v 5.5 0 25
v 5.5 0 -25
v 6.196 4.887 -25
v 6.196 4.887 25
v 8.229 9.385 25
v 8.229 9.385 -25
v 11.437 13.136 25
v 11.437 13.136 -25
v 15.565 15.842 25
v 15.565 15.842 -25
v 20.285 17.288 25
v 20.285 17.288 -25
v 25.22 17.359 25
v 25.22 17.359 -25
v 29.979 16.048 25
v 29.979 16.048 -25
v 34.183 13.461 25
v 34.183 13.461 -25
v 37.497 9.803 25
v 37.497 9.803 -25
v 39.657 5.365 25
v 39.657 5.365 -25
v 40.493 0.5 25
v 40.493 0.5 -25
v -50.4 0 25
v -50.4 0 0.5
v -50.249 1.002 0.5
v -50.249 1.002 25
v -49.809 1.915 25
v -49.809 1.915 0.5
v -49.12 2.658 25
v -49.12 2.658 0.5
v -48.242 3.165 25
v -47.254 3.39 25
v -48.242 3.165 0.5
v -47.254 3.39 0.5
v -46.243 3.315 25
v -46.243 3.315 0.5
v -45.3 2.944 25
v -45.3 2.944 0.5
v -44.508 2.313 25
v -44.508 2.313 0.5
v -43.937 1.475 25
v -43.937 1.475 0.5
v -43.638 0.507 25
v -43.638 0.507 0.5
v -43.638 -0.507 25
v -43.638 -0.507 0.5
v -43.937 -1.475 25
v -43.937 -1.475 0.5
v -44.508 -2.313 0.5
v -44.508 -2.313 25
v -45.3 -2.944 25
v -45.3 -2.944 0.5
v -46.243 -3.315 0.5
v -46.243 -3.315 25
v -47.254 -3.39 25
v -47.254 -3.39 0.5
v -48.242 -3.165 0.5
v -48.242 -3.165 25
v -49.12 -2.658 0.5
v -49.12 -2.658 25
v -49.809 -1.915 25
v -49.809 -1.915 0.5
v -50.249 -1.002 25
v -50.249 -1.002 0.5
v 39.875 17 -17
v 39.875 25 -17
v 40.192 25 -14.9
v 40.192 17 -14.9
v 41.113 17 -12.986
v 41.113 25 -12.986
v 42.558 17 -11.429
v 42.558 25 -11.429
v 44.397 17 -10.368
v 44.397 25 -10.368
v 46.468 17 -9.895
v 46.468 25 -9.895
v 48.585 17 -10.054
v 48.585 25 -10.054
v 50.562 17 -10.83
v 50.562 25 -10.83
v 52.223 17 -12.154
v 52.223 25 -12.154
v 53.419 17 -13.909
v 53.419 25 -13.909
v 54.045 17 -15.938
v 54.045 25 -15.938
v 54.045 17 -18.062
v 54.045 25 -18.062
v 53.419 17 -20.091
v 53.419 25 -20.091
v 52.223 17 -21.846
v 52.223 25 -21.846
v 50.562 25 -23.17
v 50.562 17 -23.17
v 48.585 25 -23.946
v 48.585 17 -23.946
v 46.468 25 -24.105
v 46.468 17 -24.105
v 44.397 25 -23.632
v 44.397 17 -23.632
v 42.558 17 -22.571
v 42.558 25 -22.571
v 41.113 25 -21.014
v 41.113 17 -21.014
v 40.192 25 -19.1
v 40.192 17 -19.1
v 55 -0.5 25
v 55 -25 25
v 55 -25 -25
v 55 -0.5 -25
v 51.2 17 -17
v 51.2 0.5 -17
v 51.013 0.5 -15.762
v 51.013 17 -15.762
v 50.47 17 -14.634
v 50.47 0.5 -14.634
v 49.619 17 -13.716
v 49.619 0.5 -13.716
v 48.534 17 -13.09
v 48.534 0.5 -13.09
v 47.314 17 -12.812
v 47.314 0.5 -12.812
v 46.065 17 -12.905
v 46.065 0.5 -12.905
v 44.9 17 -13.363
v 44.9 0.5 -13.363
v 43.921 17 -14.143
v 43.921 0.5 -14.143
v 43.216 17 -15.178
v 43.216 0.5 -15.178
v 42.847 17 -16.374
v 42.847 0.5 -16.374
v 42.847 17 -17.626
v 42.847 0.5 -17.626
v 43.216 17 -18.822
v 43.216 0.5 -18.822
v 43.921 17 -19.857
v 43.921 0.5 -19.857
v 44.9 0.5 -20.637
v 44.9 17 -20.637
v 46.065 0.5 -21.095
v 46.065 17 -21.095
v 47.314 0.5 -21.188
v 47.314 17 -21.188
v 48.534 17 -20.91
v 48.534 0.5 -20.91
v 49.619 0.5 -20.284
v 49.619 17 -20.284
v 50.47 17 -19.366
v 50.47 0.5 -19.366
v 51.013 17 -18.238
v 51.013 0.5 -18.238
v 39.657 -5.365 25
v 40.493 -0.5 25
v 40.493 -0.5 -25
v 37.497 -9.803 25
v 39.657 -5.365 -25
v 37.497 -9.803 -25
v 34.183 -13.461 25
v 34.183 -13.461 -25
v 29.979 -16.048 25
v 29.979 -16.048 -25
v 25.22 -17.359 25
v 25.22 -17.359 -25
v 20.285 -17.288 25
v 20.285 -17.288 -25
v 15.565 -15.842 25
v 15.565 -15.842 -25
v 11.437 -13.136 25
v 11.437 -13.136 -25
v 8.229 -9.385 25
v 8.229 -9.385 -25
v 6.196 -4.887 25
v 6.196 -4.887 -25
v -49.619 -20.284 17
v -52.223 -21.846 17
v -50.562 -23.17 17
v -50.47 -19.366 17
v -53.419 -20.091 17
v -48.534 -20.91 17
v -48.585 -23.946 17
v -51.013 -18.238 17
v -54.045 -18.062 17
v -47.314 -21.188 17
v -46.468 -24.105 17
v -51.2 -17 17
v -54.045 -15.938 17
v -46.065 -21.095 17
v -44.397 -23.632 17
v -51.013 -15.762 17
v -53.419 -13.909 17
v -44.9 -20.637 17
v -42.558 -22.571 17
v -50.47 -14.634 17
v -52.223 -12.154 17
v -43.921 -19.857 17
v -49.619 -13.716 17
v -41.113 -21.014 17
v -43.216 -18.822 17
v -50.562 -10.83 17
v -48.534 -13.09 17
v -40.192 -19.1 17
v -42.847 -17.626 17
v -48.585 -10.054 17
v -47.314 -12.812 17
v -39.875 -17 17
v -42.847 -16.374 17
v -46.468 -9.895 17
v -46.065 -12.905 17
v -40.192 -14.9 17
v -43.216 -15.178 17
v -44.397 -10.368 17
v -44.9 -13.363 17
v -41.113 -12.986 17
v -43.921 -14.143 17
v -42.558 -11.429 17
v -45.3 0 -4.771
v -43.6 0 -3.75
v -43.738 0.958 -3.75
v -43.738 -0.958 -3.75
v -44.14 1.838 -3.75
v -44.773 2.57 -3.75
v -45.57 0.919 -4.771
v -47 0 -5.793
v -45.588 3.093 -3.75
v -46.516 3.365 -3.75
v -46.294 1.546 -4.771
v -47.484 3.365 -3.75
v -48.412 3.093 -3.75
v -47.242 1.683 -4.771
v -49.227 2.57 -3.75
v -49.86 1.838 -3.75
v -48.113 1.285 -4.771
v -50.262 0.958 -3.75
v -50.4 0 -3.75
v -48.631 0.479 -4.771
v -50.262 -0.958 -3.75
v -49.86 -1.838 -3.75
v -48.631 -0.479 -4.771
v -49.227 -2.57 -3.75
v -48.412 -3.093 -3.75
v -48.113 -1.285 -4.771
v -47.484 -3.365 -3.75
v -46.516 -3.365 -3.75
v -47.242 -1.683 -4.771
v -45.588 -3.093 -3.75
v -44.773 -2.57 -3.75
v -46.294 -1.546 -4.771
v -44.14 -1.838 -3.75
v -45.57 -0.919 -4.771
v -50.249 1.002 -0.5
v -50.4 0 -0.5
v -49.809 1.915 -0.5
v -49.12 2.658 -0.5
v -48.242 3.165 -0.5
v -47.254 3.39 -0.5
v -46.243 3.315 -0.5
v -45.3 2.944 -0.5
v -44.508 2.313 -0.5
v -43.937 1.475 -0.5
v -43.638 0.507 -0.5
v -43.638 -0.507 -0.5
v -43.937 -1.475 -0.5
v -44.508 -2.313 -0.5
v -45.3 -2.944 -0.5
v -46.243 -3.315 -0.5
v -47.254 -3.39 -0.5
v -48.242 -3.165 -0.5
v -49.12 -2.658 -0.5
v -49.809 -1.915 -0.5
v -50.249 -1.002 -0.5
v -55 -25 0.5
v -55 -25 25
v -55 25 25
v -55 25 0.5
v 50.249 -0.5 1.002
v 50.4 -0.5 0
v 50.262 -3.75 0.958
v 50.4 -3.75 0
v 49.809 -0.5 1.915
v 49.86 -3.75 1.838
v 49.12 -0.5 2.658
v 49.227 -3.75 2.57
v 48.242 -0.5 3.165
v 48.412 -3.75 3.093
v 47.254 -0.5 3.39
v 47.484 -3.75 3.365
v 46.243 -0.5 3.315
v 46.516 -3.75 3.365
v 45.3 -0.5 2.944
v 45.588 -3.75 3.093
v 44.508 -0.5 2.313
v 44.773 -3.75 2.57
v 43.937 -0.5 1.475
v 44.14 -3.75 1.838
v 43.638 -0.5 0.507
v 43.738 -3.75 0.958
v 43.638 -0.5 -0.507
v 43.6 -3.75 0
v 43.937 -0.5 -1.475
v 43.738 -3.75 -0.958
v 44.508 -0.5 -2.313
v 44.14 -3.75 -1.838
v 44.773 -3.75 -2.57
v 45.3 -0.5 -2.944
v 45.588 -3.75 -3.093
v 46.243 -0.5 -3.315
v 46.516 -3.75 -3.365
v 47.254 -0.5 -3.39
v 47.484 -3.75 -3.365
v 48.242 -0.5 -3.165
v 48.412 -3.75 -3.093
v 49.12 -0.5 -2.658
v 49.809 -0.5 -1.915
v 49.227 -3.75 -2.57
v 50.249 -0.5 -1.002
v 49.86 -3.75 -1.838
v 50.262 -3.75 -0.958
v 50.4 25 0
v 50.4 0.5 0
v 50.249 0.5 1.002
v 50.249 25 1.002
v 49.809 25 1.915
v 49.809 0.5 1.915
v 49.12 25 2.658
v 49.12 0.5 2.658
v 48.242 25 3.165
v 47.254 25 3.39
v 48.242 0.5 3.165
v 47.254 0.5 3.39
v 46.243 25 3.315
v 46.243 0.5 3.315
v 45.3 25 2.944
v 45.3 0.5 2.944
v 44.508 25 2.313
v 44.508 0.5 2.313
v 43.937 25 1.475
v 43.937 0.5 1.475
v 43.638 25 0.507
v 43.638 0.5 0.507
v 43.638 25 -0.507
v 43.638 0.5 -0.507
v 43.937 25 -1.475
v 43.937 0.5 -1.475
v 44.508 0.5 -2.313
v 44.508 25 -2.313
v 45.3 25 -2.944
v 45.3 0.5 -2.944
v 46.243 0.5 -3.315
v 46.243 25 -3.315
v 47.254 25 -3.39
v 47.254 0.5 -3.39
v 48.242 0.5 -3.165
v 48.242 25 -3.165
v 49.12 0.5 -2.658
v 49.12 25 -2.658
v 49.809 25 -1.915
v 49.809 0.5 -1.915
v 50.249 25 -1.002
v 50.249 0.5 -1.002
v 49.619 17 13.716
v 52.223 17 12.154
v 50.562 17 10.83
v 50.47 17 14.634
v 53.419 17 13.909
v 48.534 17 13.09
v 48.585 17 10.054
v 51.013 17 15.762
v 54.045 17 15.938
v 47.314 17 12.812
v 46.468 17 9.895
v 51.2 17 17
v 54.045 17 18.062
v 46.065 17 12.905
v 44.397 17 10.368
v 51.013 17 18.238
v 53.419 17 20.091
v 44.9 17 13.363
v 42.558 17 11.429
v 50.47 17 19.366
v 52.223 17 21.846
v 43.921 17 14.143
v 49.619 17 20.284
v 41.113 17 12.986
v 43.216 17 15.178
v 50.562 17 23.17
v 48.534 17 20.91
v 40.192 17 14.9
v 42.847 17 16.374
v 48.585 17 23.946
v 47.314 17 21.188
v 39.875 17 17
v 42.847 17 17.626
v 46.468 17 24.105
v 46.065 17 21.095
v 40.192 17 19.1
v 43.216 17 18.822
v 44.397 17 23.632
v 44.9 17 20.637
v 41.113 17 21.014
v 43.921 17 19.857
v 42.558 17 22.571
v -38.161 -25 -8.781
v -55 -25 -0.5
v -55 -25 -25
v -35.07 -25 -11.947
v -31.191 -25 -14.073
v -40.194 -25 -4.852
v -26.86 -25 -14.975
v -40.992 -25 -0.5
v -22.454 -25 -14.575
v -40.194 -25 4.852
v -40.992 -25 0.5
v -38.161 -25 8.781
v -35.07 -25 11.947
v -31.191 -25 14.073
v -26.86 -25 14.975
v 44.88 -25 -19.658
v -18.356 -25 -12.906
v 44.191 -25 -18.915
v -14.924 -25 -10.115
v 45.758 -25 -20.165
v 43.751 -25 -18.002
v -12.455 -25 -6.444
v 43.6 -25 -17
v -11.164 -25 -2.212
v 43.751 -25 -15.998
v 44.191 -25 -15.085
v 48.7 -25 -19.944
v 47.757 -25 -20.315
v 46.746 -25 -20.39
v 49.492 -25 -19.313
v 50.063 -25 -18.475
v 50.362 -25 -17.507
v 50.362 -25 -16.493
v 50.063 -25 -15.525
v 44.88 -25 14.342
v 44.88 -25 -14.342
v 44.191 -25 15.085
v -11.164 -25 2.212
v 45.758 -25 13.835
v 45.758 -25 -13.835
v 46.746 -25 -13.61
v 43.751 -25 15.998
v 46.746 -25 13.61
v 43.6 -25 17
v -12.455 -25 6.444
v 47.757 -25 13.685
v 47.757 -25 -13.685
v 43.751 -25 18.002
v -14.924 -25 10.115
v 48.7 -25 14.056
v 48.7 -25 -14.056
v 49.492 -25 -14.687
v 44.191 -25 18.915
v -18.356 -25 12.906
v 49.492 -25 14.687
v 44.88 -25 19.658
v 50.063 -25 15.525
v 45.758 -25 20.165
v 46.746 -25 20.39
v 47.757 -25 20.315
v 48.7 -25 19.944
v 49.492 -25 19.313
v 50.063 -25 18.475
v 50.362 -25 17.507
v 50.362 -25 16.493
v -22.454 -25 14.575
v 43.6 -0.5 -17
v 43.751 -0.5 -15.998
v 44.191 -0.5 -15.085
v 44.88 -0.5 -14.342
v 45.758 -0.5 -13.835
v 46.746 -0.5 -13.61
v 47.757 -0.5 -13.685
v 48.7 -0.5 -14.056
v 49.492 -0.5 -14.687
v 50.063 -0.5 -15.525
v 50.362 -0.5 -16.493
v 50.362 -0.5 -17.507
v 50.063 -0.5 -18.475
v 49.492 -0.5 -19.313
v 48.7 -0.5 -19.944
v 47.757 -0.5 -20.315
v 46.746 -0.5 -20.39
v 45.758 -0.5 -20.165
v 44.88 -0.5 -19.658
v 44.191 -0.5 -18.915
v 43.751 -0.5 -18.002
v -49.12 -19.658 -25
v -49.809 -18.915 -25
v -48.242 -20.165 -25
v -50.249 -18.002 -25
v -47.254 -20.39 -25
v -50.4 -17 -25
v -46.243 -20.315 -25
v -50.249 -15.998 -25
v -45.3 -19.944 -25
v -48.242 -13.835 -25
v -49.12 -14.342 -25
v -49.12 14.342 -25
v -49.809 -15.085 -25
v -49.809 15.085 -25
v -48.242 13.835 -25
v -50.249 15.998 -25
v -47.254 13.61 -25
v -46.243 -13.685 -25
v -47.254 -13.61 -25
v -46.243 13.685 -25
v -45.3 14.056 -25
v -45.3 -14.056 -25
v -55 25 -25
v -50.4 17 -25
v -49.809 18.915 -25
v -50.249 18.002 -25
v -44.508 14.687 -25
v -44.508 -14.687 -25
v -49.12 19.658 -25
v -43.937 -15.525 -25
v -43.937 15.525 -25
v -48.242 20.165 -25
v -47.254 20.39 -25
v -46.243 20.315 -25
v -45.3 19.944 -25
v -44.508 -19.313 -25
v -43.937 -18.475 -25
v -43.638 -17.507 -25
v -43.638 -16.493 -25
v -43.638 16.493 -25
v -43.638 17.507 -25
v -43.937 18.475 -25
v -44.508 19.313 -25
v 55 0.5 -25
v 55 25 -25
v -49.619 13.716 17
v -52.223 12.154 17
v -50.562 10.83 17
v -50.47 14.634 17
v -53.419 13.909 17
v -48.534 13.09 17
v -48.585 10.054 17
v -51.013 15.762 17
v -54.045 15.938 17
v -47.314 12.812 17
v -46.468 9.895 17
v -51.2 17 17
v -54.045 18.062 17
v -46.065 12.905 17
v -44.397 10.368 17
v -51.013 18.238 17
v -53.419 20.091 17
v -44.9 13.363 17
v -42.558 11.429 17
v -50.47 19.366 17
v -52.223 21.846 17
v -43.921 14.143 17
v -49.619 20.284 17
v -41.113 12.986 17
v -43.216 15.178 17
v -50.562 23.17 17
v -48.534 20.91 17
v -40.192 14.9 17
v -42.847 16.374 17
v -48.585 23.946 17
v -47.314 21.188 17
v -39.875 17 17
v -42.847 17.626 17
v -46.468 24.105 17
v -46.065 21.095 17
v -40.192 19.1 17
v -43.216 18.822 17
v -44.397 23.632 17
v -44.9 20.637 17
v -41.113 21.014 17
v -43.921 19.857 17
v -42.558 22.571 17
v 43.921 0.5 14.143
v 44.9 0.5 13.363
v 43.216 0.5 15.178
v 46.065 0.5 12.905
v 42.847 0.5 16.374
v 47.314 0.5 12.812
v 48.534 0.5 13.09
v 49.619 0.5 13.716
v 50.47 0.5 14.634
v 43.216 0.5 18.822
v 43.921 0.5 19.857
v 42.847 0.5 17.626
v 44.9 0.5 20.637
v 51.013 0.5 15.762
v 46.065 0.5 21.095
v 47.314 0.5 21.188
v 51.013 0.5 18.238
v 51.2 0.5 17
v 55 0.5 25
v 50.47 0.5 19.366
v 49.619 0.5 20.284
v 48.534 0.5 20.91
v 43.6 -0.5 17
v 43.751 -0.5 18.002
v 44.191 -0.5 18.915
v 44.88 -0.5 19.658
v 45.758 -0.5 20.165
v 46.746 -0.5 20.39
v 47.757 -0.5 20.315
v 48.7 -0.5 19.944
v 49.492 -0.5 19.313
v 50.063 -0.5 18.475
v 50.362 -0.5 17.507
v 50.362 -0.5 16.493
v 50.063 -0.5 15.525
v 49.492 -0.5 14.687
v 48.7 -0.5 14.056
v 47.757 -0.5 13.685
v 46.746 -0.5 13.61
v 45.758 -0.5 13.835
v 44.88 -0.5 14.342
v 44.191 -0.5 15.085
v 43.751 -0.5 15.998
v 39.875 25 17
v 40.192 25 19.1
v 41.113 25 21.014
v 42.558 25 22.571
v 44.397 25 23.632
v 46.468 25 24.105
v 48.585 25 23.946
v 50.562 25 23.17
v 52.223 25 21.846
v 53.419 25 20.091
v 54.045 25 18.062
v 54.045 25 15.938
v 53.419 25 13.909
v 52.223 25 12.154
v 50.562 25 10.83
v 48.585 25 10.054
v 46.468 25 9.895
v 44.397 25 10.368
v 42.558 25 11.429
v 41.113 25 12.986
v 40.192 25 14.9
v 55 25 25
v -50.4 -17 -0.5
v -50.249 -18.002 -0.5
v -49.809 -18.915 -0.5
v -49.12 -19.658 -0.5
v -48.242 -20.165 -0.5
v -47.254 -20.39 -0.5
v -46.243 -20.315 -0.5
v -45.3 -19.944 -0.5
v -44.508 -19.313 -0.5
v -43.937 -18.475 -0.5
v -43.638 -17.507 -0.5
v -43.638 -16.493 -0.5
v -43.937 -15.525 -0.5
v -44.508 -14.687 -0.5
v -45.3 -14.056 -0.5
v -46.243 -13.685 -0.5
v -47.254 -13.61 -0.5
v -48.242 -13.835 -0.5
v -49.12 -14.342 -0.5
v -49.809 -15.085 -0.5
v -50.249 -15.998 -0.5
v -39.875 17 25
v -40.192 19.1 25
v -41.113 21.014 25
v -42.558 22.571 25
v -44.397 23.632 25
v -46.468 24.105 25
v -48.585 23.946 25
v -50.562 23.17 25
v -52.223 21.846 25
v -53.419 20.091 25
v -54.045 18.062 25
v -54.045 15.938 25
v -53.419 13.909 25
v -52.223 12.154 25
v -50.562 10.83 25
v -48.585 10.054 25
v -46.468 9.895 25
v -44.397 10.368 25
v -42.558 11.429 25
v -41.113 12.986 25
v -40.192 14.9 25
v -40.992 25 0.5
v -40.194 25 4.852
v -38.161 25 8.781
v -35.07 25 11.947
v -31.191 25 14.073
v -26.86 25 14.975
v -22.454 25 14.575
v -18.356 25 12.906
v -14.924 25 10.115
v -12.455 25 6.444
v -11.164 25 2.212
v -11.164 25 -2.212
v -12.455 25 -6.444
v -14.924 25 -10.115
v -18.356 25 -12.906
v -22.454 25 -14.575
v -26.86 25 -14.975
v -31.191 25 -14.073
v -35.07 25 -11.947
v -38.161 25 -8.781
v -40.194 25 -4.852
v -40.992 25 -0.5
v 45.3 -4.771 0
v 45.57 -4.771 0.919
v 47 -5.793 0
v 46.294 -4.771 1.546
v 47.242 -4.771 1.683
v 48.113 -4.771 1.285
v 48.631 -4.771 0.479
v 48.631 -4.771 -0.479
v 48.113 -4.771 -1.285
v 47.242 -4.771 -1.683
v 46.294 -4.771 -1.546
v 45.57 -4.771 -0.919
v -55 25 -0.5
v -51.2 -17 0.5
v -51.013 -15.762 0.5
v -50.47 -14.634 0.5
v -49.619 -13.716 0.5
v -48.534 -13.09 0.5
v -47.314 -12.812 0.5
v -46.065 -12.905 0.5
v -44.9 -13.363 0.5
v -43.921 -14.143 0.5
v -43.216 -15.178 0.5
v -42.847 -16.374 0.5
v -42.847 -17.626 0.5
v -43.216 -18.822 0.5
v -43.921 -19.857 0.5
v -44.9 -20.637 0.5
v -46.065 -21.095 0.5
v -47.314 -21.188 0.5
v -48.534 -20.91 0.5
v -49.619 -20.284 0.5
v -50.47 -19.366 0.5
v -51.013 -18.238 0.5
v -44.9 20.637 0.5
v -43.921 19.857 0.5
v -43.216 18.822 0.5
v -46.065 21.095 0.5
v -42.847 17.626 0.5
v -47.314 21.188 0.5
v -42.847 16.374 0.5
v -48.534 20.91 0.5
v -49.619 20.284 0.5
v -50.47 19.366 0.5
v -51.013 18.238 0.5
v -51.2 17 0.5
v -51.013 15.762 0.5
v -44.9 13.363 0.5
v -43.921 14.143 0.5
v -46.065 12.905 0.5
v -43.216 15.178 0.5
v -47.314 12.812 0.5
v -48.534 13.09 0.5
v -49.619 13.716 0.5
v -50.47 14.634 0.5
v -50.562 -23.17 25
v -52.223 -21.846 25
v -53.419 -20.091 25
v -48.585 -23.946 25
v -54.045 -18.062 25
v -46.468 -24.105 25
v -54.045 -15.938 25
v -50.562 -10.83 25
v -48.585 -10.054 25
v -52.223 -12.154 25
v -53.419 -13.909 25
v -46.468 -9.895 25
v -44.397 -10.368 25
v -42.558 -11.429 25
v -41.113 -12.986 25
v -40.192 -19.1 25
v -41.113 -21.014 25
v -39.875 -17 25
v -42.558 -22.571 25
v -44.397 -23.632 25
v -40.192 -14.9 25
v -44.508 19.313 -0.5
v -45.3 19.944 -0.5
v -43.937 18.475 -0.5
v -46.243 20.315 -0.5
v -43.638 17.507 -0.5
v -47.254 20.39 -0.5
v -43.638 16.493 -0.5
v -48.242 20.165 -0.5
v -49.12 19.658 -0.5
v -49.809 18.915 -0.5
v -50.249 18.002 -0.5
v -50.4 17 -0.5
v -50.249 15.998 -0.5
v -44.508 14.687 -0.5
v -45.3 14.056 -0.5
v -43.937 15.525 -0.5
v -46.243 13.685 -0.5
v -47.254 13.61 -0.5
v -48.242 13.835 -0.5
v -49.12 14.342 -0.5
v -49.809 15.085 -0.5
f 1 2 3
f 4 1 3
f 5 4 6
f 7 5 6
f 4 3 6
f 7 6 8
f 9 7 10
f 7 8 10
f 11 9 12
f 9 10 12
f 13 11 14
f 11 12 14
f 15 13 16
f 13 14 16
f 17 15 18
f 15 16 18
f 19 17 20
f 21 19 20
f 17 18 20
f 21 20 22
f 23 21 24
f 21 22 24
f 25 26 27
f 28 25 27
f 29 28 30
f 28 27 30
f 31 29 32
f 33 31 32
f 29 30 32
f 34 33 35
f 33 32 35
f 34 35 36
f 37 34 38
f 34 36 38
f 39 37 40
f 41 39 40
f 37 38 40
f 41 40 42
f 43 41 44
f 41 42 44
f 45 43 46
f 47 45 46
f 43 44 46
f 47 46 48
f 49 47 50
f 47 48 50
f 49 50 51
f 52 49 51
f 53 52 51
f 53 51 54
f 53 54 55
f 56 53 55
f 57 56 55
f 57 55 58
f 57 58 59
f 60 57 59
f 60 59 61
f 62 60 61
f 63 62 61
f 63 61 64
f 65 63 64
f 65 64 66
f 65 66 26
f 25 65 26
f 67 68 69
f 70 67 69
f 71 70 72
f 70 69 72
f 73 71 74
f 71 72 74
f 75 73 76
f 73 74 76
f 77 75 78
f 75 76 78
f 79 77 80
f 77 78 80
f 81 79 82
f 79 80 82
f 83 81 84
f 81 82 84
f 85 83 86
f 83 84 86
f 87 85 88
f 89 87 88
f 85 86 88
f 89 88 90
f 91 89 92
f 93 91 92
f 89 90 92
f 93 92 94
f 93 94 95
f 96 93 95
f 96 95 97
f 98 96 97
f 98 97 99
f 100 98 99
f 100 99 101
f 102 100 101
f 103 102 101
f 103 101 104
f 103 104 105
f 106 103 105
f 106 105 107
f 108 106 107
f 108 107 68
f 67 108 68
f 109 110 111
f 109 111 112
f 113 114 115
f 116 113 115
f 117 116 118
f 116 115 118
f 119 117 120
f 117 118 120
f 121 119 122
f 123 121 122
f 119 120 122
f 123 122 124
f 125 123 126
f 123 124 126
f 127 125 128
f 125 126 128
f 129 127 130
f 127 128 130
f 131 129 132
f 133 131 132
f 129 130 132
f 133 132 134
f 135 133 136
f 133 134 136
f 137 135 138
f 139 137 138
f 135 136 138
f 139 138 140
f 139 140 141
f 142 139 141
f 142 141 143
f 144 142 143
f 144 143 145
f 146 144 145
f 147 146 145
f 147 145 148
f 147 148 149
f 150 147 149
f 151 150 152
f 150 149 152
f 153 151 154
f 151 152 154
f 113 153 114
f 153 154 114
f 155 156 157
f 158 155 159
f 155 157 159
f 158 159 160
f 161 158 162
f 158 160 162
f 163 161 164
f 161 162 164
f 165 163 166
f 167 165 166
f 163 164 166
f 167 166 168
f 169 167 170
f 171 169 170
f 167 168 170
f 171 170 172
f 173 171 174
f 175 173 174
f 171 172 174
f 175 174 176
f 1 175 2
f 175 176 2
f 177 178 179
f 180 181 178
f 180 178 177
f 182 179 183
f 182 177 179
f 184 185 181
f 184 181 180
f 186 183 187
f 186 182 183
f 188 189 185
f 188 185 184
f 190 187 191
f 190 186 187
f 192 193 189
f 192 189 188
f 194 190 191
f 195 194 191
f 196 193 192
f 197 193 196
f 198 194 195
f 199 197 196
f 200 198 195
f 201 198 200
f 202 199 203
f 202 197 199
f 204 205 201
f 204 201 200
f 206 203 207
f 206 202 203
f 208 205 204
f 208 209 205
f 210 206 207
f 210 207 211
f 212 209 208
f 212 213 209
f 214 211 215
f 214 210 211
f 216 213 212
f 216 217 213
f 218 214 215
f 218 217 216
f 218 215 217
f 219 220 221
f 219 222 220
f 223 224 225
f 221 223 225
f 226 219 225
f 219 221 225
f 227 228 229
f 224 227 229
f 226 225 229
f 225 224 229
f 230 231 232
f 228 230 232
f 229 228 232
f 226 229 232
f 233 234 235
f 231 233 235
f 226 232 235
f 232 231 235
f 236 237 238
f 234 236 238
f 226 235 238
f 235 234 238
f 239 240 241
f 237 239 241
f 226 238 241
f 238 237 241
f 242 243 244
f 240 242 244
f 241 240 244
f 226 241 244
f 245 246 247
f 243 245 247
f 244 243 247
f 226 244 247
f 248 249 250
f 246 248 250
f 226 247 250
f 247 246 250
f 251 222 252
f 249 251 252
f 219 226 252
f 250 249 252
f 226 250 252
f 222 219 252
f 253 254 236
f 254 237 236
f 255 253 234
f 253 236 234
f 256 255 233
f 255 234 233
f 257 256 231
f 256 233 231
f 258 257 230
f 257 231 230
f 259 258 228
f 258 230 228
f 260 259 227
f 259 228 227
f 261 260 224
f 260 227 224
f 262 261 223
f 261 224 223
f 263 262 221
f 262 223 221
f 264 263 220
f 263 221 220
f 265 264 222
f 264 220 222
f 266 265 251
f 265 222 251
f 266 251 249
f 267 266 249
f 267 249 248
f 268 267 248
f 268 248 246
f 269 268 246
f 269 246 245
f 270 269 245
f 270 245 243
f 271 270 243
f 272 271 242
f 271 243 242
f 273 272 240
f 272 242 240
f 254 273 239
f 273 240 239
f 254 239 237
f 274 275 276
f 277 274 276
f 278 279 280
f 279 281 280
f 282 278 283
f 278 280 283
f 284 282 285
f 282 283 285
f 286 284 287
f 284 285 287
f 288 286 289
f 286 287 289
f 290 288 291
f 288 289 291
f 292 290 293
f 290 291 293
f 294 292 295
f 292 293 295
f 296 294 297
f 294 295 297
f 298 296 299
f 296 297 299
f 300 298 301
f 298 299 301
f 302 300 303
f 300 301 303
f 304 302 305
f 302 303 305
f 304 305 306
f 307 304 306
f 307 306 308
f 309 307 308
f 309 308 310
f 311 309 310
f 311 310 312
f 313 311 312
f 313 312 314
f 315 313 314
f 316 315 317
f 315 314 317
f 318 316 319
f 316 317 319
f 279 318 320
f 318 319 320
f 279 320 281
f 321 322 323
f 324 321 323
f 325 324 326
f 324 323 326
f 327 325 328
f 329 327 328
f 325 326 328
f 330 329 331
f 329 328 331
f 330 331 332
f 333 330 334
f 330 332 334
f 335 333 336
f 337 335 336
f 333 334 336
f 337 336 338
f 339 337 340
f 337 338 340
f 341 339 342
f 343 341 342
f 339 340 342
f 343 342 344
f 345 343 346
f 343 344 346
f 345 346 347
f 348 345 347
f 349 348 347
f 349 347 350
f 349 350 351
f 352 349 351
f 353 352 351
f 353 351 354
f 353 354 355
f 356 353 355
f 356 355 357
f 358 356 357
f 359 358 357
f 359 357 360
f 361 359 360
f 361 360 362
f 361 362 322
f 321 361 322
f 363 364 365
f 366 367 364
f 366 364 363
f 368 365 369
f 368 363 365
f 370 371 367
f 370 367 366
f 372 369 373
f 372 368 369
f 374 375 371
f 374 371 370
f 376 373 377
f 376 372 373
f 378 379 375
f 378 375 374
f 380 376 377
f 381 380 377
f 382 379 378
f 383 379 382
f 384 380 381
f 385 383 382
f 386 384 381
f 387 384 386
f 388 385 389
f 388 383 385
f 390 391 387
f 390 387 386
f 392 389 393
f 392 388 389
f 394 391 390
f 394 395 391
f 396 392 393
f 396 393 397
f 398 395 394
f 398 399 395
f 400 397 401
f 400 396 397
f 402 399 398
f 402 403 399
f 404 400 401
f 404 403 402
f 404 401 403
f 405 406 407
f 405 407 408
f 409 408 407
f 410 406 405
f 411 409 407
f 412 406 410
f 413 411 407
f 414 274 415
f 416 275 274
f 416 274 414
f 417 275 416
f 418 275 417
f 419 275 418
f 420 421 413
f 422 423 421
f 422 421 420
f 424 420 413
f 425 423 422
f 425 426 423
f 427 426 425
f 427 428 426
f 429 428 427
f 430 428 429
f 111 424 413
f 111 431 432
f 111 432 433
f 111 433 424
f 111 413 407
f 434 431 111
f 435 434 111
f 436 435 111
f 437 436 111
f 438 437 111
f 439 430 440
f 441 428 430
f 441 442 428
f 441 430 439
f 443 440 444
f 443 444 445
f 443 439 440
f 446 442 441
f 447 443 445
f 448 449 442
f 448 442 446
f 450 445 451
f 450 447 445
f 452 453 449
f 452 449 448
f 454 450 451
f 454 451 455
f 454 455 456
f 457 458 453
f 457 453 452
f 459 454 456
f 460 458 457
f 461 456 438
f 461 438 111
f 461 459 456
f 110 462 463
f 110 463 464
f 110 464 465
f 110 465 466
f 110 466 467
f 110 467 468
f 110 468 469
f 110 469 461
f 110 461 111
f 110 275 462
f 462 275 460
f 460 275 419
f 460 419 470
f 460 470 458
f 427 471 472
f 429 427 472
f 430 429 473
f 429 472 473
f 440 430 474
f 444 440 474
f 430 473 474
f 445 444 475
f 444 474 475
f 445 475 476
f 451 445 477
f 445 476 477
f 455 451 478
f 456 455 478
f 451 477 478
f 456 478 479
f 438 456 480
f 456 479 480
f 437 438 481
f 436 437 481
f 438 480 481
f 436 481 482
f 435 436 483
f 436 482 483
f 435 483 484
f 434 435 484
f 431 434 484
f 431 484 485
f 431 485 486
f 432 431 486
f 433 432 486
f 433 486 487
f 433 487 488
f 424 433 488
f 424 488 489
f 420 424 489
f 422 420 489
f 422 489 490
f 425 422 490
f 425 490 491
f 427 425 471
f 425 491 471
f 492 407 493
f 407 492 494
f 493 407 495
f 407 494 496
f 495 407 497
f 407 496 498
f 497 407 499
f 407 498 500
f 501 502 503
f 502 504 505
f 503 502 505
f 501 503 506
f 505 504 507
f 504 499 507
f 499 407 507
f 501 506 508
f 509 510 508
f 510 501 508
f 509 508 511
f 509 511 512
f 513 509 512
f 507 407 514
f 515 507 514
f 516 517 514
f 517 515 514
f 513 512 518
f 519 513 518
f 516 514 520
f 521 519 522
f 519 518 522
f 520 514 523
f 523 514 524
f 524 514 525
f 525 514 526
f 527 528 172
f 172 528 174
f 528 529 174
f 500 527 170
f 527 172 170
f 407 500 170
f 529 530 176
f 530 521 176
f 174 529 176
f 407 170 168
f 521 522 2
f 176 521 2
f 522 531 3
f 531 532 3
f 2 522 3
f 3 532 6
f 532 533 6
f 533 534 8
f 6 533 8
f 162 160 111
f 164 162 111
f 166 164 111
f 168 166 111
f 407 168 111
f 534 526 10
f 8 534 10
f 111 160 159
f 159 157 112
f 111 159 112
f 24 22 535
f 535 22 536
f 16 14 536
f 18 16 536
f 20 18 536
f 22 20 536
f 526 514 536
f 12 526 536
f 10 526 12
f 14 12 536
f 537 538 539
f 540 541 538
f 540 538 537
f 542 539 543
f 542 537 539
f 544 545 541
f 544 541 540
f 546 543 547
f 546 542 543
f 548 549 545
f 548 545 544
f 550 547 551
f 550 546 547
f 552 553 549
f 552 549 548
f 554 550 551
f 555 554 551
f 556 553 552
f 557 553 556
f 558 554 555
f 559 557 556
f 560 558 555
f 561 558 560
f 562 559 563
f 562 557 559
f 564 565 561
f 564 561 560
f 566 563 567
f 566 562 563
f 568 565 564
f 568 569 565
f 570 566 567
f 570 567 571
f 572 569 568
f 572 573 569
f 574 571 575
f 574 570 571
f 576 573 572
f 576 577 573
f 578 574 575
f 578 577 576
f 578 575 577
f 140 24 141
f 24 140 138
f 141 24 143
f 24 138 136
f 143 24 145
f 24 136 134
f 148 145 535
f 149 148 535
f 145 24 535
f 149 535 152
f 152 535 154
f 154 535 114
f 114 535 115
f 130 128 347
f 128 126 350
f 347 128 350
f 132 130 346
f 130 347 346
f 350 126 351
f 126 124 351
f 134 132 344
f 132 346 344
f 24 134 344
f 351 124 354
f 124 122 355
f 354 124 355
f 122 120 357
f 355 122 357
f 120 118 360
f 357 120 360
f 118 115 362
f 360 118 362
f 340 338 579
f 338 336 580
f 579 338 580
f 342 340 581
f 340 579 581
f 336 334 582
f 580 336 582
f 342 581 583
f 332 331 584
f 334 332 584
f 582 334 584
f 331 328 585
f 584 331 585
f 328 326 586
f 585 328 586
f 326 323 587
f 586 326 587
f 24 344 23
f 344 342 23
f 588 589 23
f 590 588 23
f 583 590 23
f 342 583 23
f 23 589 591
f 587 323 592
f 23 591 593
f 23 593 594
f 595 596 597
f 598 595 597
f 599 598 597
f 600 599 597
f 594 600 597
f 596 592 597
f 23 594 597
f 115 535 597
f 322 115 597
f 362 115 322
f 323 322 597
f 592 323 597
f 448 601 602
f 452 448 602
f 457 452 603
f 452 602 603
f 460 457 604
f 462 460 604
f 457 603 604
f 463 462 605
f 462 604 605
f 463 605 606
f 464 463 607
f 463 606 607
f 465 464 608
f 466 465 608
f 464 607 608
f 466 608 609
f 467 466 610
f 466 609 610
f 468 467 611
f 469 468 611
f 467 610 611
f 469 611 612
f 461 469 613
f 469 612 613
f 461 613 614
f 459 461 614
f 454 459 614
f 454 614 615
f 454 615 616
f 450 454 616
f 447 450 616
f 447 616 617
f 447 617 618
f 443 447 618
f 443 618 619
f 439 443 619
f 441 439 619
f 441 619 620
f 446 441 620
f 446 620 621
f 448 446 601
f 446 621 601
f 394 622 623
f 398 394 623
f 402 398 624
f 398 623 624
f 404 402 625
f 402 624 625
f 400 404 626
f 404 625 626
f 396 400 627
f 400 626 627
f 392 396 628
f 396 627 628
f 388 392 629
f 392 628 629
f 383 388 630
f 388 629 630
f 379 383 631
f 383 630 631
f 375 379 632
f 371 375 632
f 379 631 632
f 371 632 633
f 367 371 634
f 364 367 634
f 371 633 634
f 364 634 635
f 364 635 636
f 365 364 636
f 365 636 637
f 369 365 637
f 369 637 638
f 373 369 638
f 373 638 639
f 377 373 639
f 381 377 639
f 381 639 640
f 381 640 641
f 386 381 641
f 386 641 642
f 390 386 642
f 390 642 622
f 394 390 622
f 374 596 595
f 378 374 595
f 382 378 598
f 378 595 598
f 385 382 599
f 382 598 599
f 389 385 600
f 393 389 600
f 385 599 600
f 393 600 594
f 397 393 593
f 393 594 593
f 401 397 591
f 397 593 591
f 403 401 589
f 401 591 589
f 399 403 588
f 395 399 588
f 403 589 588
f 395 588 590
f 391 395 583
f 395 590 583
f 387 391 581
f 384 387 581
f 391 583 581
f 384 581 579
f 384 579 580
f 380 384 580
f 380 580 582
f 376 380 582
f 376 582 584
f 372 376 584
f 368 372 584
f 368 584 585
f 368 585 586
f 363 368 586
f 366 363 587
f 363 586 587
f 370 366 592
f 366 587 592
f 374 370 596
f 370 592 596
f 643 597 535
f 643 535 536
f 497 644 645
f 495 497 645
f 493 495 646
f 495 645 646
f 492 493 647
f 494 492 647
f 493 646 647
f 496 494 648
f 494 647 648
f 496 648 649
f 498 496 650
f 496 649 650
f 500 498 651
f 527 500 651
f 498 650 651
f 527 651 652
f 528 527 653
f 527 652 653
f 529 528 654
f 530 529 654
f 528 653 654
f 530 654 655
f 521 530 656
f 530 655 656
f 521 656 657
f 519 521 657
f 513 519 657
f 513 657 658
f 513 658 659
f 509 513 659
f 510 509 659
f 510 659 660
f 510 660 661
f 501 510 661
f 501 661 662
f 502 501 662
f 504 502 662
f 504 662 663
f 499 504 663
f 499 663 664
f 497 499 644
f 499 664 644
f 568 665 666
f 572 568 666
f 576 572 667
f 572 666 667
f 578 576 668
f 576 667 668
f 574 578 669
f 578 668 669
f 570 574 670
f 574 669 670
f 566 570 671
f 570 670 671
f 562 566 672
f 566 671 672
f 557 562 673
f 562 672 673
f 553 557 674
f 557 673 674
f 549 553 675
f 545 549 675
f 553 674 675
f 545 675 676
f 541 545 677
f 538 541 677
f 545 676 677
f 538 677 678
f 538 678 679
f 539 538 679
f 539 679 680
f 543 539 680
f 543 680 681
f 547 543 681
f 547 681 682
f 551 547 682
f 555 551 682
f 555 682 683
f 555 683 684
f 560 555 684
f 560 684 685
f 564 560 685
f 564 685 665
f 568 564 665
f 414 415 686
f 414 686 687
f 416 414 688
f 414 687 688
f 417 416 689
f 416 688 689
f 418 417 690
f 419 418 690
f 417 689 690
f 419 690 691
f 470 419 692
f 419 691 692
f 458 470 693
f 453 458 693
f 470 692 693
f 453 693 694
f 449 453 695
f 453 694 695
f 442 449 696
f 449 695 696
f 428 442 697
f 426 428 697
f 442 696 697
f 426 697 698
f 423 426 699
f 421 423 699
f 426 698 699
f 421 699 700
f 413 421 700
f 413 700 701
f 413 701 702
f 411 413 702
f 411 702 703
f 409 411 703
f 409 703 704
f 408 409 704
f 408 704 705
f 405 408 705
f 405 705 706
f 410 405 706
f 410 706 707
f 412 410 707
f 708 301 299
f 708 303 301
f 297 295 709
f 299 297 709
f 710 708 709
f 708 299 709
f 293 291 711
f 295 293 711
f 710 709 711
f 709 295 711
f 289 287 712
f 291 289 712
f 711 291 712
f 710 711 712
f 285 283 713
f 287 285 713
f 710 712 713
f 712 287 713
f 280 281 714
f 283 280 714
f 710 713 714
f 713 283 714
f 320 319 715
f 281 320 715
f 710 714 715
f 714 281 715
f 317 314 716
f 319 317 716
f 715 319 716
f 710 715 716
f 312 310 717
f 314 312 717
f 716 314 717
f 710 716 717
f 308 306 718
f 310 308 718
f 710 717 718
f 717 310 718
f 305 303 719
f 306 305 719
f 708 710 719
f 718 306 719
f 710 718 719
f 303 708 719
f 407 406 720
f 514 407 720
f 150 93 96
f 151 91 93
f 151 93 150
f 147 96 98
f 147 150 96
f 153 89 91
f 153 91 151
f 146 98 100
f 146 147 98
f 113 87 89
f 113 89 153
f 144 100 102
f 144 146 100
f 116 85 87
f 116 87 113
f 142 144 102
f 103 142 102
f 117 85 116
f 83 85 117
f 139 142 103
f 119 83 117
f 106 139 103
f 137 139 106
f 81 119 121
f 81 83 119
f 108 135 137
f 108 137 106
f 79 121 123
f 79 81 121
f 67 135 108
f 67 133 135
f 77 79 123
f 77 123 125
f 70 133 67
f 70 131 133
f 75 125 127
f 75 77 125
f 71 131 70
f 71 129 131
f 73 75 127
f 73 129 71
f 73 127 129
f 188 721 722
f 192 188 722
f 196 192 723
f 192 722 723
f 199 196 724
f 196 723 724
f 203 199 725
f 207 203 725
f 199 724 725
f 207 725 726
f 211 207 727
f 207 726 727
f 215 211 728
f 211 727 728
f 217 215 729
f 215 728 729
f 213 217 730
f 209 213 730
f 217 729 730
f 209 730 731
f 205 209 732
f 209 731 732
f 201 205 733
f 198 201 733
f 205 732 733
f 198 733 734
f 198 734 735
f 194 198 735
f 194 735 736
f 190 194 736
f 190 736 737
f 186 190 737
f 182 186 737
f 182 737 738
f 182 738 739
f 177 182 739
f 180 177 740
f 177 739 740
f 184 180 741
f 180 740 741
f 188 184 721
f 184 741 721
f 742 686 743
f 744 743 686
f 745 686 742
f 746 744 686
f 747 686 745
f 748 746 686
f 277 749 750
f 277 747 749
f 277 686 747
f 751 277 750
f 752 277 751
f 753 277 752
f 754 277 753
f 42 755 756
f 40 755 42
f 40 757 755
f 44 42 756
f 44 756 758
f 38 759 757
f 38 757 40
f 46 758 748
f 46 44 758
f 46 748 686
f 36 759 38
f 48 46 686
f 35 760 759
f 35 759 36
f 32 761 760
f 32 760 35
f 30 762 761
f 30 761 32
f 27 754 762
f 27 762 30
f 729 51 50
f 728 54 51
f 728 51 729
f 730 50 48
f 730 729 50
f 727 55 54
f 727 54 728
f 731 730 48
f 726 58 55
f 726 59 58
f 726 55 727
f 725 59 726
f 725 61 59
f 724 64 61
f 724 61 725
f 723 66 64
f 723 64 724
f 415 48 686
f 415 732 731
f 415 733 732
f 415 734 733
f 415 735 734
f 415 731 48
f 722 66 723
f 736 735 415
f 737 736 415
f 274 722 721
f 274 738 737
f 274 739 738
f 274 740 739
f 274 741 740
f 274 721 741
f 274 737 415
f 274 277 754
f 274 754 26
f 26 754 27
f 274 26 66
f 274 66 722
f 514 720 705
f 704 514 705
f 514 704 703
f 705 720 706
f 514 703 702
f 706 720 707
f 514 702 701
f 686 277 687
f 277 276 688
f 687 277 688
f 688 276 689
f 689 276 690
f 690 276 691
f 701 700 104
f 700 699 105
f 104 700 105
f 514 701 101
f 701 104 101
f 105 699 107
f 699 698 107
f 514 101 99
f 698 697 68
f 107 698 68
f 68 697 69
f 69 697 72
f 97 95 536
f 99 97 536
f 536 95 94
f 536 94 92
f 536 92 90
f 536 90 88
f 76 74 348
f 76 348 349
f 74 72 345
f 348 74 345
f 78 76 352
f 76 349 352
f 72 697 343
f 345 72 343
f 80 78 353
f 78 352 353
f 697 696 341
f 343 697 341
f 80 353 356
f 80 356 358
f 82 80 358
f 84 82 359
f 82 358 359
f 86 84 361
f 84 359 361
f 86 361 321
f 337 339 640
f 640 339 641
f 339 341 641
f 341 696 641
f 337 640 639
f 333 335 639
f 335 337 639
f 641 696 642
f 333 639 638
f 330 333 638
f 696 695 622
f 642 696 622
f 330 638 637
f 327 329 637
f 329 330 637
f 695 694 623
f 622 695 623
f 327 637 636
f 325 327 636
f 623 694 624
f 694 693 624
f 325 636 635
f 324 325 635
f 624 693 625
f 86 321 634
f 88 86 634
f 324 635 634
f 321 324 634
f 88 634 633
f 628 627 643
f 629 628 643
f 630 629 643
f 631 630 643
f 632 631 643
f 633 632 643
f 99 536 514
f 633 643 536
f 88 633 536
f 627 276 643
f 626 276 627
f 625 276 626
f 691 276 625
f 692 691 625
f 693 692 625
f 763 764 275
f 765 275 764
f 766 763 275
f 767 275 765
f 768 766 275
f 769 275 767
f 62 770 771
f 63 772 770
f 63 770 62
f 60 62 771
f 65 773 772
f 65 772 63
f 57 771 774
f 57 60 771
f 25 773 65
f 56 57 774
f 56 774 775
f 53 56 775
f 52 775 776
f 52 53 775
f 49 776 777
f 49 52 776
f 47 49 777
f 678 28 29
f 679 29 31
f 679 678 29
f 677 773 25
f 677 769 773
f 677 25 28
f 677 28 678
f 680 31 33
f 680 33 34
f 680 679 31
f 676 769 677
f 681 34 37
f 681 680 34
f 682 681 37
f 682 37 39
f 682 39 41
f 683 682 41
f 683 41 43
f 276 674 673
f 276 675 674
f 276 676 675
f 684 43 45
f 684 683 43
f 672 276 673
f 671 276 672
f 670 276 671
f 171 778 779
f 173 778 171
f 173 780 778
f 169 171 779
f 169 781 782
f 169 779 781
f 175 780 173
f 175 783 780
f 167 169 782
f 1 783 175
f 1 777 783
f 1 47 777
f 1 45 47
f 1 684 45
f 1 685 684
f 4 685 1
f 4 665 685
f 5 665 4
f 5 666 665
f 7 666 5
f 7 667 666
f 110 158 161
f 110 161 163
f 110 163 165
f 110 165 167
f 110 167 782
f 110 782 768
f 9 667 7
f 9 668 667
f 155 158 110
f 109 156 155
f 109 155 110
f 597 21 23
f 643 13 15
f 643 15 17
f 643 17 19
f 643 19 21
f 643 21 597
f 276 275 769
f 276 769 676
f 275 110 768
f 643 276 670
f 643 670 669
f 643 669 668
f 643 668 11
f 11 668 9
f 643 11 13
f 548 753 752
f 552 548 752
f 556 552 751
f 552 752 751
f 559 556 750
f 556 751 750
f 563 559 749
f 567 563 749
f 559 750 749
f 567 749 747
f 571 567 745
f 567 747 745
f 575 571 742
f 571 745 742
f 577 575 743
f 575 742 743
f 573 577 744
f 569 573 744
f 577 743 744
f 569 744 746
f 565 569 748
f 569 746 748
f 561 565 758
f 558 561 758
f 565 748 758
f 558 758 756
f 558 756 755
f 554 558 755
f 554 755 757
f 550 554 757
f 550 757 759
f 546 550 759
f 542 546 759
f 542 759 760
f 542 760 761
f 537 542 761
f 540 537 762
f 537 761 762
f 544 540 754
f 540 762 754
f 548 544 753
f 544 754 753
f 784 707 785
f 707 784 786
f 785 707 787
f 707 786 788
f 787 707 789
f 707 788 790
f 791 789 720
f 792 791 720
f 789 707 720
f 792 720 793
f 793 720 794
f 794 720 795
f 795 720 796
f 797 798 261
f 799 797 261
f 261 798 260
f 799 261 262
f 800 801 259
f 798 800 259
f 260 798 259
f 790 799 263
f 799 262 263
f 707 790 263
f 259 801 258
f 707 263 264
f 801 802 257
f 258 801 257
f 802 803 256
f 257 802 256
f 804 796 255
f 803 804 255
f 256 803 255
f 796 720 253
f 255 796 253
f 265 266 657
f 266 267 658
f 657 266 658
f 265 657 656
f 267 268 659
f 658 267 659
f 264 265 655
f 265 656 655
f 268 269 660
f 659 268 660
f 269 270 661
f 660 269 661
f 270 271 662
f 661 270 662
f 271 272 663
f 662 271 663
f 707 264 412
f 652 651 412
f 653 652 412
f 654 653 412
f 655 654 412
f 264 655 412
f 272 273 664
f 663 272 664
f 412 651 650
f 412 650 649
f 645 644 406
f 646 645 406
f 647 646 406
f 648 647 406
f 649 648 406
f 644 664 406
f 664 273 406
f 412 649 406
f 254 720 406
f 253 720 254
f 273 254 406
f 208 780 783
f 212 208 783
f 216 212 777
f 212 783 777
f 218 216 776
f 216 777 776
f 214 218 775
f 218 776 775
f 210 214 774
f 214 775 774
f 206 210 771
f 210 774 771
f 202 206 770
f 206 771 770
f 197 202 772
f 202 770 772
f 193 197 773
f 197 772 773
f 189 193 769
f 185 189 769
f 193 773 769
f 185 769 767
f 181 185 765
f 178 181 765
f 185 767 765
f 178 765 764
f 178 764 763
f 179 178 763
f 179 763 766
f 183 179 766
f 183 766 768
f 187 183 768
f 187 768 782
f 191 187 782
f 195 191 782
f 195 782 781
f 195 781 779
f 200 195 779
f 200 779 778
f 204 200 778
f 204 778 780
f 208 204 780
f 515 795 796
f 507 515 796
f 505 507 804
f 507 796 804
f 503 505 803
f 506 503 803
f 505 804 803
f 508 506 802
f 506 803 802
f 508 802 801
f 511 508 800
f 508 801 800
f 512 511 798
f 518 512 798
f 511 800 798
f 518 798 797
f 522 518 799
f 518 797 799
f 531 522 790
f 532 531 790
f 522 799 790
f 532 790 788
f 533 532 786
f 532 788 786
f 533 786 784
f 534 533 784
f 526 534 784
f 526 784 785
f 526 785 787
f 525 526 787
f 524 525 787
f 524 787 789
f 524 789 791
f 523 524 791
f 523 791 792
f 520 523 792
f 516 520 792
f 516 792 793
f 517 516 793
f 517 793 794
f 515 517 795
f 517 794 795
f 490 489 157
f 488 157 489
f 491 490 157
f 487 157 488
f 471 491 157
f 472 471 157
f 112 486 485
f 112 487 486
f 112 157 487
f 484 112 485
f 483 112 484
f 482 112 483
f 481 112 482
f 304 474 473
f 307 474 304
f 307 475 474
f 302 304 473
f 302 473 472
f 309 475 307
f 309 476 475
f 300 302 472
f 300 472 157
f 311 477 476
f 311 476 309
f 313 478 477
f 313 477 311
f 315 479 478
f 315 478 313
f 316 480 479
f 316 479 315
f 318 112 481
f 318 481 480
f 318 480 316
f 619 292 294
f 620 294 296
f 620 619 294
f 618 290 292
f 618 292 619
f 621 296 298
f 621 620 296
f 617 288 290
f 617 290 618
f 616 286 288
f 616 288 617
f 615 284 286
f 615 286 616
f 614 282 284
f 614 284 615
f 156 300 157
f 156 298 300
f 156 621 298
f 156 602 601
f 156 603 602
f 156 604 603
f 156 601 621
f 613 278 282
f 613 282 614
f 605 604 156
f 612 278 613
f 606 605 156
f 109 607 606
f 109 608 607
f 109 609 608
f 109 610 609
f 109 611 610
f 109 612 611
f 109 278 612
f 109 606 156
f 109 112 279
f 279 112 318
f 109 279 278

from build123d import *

# Parameters (mm, degrees)
F0_W                 = 110
F0_H                 = 50
F1_DEPTH             = 25
F6_D                 = 30
F7_D                 = 35
F8_D                 = 6.8
F8_DEPTH             = 28.25
F8_TIP               = 2.0429261047
F8_ON_F2_D           = 6.8
F8_ON_F2_DEPTH       = 28.25
F8_ON_F2_TIP         = 2.0429261047
F9_D                 = 8.4
F9_DEPTH             = 25
F9_CBORE_D           = 14.25
F9_CBORE_DEPTH       = 8
F9_TIP               = 2.5236145999
F9_ON_F5_D           = 8.4
F9_ON_F5_DEPTH       = 25
F9_ON_F5_CBORE_D     = 14.25
F9_ON_F5_CBORE_DEPTH = 8
F9_ON_F5_TIP         = 2.5236145999
F11_W                = 50
F11_H                = 1
F12_DEPTH            = 25
F10_W                = 1
F10_H                = 50
F13_DEPTH            = 25.0000003725
F14_D                = 6.8
F14_DEPTH            = 28.75
F14_TIP              = 2.0429261047
F14_ON_F3_D          = 6.8
F14_ON_F3_DEPTH      = 28.75
F14_ON_F3_TIP        = 2.0429261047


with BuildPart() as f1:
    # F0 (on Top) → F1 (new body, symmetric)
    with BuildSketch(Plane.XY):
        Rectangle(F0_W, F0_H)
    extrude(amount=F1_DEPTH, both=True)

    # F6 (through all)
    with Locations(Plane.XZ.offset(25)):
        with Locations((-26, 0)):
            Hole(F6_D / 2)

    # F7 (through all)
    with Locations(Plane.XY.offset(25)):
        with Locations((23, 0)):
            Hole(F7_D / 2)

    # F8
    with Locations(Plane(origin=(0, 0, -25), x_dir=(1, 0, 0), z_dir=(0, 0, -1))):
        with Locations((-47, -17), (-47, 17)):
            Hole(F8_D / 2, depth=F8_DEPTH)
            with Locations((0, 0, -(F8_DEPTH + F8_TIP / 2))):  # 118° drill point
                Cone(0, F8_D / 2, F8_TIP, mode=Mode.SUBTRACT)

    # F8 on F2
    with Locations(Plane.XZ.offset(25)):
        with Locations((47, 17), (47, -17)):
            Hole(F8_ON_F2_D / 2, depth=F8_ON_F2_DEPTH)
            with Locations((0, 0, -(F8_ON_F2_DEPTH + F8_ON_F2_TIP / 2))):  # 118° drill point
                Cone(0, F8_ON_F2_D / 2, F8_ON_F2_TIP, mode=Mode.SUBTRACT)

    # F9
    with Locations(Plane.XY.offset(25)):
        with Locations((-47, 17), (-47, -17)):
            CounterBoreHole(F9_D / 2, F9_CBORE_D / 2, F9_CBORE_DEPTH, depth=F9_DEPTH)
            with Locations((0, 0, -(F9_DEPTH + F9_TIP / 2))):  # 118° drill point
                Cone(0, F9_D / 2, F9_TIP, mode=Mode.SUBTRACT)

    # F9 on F5
    with Locations(Plane(origin=(0, 25, 0), x_dir=(-1, 0, 0), z_dir=(0, 1, 0))):
        with Locations((-47, 17), (-47, -17)):
            CounterBoreHole(F9_ON_F5_D / 2, F9_ON_F5_CBORE_D / 2, F9_ON_F5_CBORE_DEPTH, depth=F9_ON_F5_DEPTH)
            with Locations((0, 0, -(F9_ON_F5_DEPTH + F9_ON_F5_TIP / 2))):  # 118° drill point
                Cone(0, F9_ON_F5_D / 2, F9_ON_F5_TIP, mode=Mode.SUBTRACT)

    # F11 (on face) → F12 (cut)
    with BuildSketch(Plane(origin=(-55, 0, 0), x_dir=(0, -1, 0), z_dir=(-1, 0, 0))):
        Rectangle(F11_W, F11_H)
    extrude(amount=-F12_DEPTH, mode=Mode.SUBTRACT)

    # F10 (on face) → F13 (cut)
    with BuildSketch(Plane.YZ.offset(55)):
        Rectangle(F10_W, F10_H)
    extrude(amount=-F13_DEPTH, mode=Mode.SUBTRACT)

    # F14
    with Locations(Plane(origin=(0, 25, 0), x_dir=(-1, 0, 0), z_dir=(0, 1, 0))):
        with Locations((-47, 0)):
            Hole(F14_D / 2, depth=F14_DEPTH)
            with Locations((0, 0, -(F14_DEPTH + F14_TIP / 2))):  # 118° drill point
                Cone(0, F14_D / 2, F14_TIP, mode=Mode.SUBTRACT)

    # F14 on F3
    with Locations(Plane.XY.offset(25)):
        with Locations((-47, 0)):
            Hole(F14_ON_F3_D / 2, depth=F14_ON_F3_DEPTH)
            with Locations((0, 0, -(F14_ON_F3_DEPTH + F14_ON_F3_TIP / 2))):  # 118° drill point
                Cone(0, F14_ON_F3_D / 2, F14_ON_F3_TIP, mode=Mode.SUBTRACT)


solid = f1.part
